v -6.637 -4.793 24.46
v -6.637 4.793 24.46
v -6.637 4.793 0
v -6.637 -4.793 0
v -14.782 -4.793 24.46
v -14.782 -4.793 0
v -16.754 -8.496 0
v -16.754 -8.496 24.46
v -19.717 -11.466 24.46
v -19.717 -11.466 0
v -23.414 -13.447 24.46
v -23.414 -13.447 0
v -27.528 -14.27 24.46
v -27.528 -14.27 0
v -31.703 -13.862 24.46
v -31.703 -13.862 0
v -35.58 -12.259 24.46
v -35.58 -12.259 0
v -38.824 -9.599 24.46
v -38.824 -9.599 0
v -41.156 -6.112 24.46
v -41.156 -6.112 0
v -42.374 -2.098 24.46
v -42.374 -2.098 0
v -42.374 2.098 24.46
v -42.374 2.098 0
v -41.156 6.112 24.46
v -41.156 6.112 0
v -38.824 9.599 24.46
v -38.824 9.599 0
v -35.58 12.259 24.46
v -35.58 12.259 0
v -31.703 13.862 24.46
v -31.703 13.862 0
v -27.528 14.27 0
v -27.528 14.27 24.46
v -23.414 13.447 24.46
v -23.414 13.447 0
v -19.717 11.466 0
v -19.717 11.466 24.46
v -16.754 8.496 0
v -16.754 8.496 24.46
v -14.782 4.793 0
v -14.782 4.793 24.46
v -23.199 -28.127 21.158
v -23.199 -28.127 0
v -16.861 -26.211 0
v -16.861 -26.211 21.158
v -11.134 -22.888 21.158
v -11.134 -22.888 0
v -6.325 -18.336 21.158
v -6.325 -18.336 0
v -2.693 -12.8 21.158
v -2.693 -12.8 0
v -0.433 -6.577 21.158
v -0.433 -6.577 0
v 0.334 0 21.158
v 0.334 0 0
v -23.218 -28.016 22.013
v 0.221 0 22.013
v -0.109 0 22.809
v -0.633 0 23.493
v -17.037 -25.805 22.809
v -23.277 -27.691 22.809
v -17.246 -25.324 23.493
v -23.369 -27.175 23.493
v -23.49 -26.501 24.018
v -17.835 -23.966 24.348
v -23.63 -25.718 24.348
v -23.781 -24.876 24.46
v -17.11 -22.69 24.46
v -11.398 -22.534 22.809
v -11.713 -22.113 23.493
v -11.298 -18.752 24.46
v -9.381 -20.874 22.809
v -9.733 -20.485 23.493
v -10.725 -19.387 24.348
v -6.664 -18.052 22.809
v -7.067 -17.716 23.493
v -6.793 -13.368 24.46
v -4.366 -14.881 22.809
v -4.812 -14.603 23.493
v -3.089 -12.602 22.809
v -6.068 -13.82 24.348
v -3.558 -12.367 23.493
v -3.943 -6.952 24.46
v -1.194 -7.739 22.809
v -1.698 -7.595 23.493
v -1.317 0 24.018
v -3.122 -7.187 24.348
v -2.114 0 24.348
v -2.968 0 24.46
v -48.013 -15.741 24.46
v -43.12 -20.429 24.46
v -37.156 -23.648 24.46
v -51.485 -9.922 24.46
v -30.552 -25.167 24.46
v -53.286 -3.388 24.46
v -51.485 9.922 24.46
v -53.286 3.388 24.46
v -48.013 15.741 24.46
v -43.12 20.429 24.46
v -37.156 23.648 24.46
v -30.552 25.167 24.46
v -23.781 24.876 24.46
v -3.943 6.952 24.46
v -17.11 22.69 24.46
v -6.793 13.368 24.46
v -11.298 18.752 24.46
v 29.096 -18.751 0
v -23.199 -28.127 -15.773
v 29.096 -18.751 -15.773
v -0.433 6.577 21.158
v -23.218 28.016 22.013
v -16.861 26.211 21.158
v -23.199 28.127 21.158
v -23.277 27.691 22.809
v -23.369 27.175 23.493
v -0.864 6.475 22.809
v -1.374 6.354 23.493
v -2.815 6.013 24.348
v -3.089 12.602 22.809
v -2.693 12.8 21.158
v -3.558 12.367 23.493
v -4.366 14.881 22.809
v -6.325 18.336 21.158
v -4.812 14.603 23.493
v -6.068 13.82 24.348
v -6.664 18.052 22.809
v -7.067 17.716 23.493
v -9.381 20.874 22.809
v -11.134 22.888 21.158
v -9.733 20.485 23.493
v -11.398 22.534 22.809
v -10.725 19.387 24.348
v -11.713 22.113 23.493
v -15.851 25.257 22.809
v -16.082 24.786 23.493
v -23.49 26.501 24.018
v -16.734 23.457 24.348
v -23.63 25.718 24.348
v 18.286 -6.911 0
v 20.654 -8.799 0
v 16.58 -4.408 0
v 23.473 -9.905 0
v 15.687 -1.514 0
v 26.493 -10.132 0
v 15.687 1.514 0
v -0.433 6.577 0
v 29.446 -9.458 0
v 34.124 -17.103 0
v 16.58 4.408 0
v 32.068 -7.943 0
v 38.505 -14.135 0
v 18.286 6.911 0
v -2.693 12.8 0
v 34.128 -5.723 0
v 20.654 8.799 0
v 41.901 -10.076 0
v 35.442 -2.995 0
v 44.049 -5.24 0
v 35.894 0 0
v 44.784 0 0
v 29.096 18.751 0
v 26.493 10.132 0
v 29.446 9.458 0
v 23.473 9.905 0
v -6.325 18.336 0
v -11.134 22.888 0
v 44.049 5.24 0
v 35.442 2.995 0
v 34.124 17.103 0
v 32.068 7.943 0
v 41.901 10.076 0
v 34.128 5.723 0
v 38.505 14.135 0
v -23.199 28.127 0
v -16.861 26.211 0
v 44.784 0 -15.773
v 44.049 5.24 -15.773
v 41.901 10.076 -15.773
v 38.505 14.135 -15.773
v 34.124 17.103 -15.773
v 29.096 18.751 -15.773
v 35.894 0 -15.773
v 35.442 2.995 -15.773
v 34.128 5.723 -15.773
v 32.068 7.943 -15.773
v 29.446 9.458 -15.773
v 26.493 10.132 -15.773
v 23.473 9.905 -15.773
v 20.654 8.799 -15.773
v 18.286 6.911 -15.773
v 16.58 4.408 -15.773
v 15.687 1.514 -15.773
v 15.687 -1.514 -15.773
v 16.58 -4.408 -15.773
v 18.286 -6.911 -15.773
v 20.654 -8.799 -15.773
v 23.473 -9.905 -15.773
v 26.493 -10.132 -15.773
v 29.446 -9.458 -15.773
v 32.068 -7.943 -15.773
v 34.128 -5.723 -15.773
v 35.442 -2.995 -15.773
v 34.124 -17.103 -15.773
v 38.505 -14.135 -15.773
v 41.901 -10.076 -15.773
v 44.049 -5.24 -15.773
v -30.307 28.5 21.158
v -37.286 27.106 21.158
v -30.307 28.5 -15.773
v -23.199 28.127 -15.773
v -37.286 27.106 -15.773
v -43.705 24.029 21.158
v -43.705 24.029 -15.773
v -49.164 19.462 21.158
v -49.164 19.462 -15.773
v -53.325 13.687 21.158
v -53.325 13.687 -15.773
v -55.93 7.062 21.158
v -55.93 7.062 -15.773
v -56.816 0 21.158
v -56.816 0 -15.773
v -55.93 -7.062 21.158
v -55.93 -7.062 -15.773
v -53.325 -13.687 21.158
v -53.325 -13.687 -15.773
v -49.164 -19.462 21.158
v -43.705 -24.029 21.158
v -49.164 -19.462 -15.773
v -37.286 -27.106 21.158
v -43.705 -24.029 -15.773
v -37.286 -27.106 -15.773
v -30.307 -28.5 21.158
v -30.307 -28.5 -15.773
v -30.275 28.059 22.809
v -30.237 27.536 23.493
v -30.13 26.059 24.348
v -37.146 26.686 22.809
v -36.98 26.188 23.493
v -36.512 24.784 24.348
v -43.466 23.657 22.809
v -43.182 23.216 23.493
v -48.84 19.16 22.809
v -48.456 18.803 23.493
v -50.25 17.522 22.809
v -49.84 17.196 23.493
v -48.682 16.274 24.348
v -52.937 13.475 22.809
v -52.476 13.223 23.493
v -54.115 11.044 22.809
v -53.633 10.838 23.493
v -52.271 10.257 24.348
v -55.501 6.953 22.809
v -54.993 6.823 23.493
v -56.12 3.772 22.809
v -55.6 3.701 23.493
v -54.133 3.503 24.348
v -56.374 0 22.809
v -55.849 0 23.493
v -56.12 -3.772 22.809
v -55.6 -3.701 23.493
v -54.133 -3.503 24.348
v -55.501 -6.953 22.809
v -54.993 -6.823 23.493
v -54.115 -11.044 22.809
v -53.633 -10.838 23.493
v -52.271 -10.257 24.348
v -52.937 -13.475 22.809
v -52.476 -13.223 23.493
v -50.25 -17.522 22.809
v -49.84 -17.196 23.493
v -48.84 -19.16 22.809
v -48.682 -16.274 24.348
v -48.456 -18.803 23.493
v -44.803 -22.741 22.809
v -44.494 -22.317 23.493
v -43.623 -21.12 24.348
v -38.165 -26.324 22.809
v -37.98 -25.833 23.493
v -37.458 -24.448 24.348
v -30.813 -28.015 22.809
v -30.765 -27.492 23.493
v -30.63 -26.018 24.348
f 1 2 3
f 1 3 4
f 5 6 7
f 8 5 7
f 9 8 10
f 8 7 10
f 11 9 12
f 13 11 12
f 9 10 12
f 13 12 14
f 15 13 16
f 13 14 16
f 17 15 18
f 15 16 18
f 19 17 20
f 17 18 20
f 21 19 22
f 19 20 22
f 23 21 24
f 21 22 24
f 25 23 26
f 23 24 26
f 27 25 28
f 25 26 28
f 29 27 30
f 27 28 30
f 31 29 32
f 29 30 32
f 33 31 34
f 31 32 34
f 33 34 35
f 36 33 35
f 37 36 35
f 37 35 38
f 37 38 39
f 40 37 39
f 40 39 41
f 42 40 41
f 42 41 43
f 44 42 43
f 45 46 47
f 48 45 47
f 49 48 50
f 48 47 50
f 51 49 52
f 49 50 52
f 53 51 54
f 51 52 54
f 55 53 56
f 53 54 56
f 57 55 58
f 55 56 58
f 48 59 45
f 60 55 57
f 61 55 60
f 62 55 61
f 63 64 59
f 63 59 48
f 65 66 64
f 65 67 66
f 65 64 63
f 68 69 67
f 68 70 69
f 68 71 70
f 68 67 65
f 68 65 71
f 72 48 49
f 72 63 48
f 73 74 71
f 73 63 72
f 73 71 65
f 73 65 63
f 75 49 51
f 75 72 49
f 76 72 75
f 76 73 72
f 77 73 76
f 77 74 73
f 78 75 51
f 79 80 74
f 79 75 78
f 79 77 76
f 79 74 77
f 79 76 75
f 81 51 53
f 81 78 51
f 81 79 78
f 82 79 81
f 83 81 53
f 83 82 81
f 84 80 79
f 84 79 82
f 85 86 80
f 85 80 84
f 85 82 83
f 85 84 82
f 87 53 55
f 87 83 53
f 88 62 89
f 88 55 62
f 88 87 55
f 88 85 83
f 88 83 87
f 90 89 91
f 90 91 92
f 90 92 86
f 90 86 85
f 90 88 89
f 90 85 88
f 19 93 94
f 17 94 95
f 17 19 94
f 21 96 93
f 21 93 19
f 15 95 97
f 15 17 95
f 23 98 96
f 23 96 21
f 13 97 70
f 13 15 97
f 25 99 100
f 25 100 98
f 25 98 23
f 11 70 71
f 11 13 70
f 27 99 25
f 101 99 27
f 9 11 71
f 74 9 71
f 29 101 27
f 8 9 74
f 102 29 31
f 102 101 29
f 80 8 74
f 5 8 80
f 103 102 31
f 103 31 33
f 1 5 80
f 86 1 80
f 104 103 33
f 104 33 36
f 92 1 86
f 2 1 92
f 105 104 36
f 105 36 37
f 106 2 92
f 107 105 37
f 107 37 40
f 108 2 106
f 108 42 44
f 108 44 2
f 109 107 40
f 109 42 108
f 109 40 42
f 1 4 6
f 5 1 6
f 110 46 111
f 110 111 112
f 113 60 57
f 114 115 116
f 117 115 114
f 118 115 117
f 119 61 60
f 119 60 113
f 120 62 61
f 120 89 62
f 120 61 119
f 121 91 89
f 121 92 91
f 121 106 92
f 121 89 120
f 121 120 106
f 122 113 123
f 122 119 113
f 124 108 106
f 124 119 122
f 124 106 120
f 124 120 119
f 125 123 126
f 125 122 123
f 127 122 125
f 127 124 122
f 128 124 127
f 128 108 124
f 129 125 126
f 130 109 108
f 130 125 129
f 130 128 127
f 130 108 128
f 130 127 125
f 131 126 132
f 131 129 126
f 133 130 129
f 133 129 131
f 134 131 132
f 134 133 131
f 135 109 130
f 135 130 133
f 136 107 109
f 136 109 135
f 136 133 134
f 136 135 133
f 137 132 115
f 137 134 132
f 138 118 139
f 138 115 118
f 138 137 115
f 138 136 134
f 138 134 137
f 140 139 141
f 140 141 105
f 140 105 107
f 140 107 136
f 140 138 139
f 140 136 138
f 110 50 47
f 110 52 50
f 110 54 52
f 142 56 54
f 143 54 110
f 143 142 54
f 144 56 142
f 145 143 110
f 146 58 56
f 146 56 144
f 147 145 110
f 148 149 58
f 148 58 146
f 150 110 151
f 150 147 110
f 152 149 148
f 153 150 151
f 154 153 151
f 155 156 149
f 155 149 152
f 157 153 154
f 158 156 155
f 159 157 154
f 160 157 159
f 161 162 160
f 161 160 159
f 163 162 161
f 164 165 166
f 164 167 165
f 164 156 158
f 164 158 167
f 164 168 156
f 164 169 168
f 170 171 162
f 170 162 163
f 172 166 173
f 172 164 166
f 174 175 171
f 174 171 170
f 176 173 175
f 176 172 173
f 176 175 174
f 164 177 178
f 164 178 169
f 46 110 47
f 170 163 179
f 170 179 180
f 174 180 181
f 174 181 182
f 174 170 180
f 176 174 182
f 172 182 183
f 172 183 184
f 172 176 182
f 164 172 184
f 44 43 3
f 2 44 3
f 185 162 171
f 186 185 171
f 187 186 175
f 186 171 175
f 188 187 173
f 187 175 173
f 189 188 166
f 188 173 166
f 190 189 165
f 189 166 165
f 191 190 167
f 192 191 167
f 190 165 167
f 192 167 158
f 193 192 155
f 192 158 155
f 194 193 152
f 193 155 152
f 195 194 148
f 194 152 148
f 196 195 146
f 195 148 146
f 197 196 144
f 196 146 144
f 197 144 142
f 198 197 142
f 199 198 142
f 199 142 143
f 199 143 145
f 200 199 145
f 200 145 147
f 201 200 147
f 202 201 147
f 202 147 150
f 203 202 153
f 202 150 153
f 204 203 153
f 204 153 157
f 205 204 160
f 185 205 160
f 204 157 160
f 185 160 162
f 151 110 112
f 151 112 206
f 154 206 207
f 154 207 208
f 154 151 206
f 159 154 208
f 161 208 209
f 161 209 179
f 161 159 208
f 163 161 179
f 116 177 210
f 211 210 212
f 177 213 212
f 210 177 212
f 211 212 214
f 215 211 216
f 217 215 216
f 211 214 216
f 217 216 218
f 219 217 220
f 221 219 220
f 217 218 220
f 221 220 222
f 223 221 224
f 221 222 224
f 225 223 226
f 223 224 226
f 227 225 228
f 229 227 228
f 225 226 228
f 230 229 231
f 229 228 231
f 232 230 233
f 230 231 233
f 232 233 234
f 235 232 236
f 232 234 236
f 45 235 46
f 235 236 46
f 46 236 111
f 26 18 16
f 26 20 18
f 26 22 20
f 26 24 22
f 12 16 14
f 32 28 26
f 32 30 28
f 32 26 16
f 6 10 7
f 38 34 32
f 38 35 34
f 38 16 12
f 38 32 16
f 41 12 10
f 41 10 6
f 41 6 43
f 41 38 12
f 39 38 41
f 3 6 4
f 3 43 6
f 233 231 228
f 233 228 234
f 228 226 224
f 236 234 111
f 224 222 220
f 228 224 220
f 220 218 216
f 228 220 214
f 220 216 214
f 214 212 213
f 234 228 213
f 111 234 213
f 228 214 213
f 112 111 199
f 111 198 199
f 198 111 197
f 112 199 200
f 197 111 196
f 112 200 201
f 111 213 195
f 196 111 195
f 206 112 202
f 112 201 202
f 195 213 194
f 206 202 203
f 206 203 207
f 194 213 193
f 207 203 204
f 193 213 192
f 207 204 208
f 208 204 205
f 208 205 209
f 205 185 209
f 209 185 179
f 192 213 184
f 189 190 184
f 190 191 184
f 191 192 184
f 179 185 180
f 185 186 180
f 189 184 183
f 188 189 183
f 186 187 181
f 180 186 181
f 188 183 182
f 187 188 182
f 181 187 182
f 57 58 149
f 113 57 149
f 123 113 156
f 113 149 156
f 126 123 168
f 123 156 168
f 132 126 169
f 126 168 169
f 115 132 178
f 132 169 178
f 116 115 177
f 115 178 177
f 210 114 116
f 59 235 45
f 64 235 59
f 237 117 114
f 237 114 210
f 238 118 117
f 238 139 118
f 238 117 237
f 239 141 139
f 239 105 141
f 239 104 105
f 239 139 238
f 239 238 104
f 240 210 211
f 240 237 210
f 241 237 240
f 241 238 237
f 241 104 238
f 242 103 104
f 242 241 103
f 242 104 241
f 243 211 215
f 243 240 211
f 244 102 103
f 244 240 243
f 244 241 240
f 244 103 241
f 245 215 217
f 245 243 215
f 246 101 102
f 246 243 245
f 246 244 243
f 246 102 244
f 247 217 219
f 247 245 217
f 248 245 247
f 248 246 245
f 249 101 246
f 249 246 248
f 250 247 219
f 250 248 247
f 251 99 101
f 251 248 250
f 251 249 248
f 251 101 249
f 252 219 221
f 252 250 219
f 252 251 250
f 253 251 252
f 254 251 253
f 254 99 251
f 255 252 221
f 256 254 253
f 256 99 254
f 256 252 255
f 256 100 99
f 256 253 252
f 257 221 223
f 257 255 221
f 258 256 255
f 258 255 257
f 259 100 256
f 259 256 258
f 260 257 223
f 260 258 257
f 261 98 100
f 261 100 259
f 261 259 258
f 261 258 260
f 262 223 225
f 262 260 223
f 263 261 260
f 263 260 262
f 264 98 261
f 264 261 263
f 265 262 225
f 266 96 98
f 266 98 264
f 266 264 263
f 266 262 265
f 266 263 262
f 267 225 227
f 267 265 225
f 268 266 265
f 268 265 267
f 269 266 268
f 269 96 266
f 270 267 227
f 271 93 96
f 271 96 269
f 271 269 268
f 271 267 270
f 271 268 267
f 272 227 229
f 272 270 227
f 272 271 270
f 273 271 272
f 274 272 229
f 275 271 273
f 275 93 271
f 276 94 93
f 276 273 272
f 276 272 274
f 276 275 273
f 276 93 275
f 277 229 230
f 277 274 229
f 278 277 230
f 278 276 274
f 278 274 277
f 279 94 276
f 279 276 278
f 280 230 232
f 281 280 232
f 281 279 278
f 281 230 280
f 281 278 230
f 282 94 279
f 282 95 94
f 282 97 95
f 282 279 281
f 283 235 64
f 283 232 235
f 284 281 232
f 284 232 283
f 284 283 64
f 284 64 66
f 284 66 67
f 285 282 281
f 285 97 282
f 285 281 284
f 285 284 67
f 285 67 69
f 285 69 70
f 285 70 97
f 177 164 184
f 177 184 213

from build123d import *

# Parameters (mm, degrees)
F0_R     = 10.16
F1_DEPTH = 15.7734
F2_DEPTH = 24.4602
F3_R     = 3.302


with BuildPart() as f1:
    # F0 (on Top) → F1 (new body)
    with BuildSketch(Plane.XY):
        with BuildLine():
            ThreePointArc((-23.198551, -28.126541), (-6.325173, -18.336262), (0.333802, 0))
            ThreePointArc((0.333802, 0), (-6.325173, 18.336262), (-23.198551, 28.126541))
            ThreePointArc((-23.198551, 28.126541), (-56.816198, 0), (-23.198551, -28.126541))
        make_face()
        with BuildLine():
            ThreePointArc((-14.781716, -4.793226), (-42.528698, 0), (-14.781716, 4.793226))
            Line((-14.781716, 4.793226), (-6.636774, 4.793226))
            Line((-6.636774, 4.793226), (-6.636774, -4.793226))
            Line((-6.636774, -4.793226), (-14.781716, -4.793226))
        make_face(mode=Mode.SUBTRACT)
        with BuildLine():
            ThreePointArc((-23.198551, 28.126541), (-6.325173, 18.336262), (0.333802, 0))
            ThreePointArc((0.333802, 0), (-6.325173, -18.336262), (-23.198551, -28.126541))
            Line((-23.198551, -28.126541), (29.095567, -18.751028))
            ThreePointArc((29.095567, -18.751028), (6.683802, 0), (29.095567, 18.751028))
            Line((29.095567, 18.751028), (-23.198551, 28.126541))
        make_face()
        with BuildLine():
            ThreePointArc((44.783802, 0), (40.344485, 12.224174), (29.095567, 18.751028))
            ThreePointArc((29.095567, 18.751028), (6.683802, 0), (29.095567, -18.751028))
            ThreePointArc((29.095567, -18.751028), (40.344485, -12.224174), (44.783802, 0))
        make_face()
        with Locations((25.733802, 0)):
            Circle(F0_R, mode=Mode.SUBTRACT)
        with BuildLine():
            Line((-6.636774, 4.793226), (-14.781716, 4.793226))
            ThreePointArc((-14.781716, 4.793226), (-42.528698, 0), (-14.781716, -4.793226))
            Line((-14.781716, -4.793226), (-6.636774, -4.793226))
            Line((-6.636774, -4.793226), (-6.636774, 4.793226))
        make_face()
    extrude(amount=-F1_DEPTH)

    # F0 (on Top) → F2 (join)
    with BuildSketch(Plane.XY):
        with BuildLine():
            ThreePointArc((-23.198551, -28.126541), (-6.325173, -18.336262), (0.333802, 0))
            ThreePointArc((0.333802, 0), (-6.325173, 18.336262), (-23.198551, 28.126541))
            ThreePointArc((-23.198551, 28.126541), (-56.816198, 0), (-23.198551, -28.126541))
        make_face()
        with BuildLine():
            ThreePointArc((-14.781716, -4.793226), (-42.528698, 0), (-14.781716, 4.793226))
            Line((-14.781716, 4.793226), (-6.636774, 4.793226))
            Line((-6.636774, 4.793226), (-6.636774, -4.793226))
            Line((-6.636774, -4.793226), (-14.781716, -4.793226))
        make_face(mode=Mode.SUBTRACT)
    extrude(amount=F2_DEPTH)

    # F3
    f3_edges = [f1.edges().sort_by_distance(p)[0] for p in [
        (-33.283845, 28.126541, 24.4602),
    ]]
    fillet(f3_edges, radius=F3_R)


solid = f1.part
